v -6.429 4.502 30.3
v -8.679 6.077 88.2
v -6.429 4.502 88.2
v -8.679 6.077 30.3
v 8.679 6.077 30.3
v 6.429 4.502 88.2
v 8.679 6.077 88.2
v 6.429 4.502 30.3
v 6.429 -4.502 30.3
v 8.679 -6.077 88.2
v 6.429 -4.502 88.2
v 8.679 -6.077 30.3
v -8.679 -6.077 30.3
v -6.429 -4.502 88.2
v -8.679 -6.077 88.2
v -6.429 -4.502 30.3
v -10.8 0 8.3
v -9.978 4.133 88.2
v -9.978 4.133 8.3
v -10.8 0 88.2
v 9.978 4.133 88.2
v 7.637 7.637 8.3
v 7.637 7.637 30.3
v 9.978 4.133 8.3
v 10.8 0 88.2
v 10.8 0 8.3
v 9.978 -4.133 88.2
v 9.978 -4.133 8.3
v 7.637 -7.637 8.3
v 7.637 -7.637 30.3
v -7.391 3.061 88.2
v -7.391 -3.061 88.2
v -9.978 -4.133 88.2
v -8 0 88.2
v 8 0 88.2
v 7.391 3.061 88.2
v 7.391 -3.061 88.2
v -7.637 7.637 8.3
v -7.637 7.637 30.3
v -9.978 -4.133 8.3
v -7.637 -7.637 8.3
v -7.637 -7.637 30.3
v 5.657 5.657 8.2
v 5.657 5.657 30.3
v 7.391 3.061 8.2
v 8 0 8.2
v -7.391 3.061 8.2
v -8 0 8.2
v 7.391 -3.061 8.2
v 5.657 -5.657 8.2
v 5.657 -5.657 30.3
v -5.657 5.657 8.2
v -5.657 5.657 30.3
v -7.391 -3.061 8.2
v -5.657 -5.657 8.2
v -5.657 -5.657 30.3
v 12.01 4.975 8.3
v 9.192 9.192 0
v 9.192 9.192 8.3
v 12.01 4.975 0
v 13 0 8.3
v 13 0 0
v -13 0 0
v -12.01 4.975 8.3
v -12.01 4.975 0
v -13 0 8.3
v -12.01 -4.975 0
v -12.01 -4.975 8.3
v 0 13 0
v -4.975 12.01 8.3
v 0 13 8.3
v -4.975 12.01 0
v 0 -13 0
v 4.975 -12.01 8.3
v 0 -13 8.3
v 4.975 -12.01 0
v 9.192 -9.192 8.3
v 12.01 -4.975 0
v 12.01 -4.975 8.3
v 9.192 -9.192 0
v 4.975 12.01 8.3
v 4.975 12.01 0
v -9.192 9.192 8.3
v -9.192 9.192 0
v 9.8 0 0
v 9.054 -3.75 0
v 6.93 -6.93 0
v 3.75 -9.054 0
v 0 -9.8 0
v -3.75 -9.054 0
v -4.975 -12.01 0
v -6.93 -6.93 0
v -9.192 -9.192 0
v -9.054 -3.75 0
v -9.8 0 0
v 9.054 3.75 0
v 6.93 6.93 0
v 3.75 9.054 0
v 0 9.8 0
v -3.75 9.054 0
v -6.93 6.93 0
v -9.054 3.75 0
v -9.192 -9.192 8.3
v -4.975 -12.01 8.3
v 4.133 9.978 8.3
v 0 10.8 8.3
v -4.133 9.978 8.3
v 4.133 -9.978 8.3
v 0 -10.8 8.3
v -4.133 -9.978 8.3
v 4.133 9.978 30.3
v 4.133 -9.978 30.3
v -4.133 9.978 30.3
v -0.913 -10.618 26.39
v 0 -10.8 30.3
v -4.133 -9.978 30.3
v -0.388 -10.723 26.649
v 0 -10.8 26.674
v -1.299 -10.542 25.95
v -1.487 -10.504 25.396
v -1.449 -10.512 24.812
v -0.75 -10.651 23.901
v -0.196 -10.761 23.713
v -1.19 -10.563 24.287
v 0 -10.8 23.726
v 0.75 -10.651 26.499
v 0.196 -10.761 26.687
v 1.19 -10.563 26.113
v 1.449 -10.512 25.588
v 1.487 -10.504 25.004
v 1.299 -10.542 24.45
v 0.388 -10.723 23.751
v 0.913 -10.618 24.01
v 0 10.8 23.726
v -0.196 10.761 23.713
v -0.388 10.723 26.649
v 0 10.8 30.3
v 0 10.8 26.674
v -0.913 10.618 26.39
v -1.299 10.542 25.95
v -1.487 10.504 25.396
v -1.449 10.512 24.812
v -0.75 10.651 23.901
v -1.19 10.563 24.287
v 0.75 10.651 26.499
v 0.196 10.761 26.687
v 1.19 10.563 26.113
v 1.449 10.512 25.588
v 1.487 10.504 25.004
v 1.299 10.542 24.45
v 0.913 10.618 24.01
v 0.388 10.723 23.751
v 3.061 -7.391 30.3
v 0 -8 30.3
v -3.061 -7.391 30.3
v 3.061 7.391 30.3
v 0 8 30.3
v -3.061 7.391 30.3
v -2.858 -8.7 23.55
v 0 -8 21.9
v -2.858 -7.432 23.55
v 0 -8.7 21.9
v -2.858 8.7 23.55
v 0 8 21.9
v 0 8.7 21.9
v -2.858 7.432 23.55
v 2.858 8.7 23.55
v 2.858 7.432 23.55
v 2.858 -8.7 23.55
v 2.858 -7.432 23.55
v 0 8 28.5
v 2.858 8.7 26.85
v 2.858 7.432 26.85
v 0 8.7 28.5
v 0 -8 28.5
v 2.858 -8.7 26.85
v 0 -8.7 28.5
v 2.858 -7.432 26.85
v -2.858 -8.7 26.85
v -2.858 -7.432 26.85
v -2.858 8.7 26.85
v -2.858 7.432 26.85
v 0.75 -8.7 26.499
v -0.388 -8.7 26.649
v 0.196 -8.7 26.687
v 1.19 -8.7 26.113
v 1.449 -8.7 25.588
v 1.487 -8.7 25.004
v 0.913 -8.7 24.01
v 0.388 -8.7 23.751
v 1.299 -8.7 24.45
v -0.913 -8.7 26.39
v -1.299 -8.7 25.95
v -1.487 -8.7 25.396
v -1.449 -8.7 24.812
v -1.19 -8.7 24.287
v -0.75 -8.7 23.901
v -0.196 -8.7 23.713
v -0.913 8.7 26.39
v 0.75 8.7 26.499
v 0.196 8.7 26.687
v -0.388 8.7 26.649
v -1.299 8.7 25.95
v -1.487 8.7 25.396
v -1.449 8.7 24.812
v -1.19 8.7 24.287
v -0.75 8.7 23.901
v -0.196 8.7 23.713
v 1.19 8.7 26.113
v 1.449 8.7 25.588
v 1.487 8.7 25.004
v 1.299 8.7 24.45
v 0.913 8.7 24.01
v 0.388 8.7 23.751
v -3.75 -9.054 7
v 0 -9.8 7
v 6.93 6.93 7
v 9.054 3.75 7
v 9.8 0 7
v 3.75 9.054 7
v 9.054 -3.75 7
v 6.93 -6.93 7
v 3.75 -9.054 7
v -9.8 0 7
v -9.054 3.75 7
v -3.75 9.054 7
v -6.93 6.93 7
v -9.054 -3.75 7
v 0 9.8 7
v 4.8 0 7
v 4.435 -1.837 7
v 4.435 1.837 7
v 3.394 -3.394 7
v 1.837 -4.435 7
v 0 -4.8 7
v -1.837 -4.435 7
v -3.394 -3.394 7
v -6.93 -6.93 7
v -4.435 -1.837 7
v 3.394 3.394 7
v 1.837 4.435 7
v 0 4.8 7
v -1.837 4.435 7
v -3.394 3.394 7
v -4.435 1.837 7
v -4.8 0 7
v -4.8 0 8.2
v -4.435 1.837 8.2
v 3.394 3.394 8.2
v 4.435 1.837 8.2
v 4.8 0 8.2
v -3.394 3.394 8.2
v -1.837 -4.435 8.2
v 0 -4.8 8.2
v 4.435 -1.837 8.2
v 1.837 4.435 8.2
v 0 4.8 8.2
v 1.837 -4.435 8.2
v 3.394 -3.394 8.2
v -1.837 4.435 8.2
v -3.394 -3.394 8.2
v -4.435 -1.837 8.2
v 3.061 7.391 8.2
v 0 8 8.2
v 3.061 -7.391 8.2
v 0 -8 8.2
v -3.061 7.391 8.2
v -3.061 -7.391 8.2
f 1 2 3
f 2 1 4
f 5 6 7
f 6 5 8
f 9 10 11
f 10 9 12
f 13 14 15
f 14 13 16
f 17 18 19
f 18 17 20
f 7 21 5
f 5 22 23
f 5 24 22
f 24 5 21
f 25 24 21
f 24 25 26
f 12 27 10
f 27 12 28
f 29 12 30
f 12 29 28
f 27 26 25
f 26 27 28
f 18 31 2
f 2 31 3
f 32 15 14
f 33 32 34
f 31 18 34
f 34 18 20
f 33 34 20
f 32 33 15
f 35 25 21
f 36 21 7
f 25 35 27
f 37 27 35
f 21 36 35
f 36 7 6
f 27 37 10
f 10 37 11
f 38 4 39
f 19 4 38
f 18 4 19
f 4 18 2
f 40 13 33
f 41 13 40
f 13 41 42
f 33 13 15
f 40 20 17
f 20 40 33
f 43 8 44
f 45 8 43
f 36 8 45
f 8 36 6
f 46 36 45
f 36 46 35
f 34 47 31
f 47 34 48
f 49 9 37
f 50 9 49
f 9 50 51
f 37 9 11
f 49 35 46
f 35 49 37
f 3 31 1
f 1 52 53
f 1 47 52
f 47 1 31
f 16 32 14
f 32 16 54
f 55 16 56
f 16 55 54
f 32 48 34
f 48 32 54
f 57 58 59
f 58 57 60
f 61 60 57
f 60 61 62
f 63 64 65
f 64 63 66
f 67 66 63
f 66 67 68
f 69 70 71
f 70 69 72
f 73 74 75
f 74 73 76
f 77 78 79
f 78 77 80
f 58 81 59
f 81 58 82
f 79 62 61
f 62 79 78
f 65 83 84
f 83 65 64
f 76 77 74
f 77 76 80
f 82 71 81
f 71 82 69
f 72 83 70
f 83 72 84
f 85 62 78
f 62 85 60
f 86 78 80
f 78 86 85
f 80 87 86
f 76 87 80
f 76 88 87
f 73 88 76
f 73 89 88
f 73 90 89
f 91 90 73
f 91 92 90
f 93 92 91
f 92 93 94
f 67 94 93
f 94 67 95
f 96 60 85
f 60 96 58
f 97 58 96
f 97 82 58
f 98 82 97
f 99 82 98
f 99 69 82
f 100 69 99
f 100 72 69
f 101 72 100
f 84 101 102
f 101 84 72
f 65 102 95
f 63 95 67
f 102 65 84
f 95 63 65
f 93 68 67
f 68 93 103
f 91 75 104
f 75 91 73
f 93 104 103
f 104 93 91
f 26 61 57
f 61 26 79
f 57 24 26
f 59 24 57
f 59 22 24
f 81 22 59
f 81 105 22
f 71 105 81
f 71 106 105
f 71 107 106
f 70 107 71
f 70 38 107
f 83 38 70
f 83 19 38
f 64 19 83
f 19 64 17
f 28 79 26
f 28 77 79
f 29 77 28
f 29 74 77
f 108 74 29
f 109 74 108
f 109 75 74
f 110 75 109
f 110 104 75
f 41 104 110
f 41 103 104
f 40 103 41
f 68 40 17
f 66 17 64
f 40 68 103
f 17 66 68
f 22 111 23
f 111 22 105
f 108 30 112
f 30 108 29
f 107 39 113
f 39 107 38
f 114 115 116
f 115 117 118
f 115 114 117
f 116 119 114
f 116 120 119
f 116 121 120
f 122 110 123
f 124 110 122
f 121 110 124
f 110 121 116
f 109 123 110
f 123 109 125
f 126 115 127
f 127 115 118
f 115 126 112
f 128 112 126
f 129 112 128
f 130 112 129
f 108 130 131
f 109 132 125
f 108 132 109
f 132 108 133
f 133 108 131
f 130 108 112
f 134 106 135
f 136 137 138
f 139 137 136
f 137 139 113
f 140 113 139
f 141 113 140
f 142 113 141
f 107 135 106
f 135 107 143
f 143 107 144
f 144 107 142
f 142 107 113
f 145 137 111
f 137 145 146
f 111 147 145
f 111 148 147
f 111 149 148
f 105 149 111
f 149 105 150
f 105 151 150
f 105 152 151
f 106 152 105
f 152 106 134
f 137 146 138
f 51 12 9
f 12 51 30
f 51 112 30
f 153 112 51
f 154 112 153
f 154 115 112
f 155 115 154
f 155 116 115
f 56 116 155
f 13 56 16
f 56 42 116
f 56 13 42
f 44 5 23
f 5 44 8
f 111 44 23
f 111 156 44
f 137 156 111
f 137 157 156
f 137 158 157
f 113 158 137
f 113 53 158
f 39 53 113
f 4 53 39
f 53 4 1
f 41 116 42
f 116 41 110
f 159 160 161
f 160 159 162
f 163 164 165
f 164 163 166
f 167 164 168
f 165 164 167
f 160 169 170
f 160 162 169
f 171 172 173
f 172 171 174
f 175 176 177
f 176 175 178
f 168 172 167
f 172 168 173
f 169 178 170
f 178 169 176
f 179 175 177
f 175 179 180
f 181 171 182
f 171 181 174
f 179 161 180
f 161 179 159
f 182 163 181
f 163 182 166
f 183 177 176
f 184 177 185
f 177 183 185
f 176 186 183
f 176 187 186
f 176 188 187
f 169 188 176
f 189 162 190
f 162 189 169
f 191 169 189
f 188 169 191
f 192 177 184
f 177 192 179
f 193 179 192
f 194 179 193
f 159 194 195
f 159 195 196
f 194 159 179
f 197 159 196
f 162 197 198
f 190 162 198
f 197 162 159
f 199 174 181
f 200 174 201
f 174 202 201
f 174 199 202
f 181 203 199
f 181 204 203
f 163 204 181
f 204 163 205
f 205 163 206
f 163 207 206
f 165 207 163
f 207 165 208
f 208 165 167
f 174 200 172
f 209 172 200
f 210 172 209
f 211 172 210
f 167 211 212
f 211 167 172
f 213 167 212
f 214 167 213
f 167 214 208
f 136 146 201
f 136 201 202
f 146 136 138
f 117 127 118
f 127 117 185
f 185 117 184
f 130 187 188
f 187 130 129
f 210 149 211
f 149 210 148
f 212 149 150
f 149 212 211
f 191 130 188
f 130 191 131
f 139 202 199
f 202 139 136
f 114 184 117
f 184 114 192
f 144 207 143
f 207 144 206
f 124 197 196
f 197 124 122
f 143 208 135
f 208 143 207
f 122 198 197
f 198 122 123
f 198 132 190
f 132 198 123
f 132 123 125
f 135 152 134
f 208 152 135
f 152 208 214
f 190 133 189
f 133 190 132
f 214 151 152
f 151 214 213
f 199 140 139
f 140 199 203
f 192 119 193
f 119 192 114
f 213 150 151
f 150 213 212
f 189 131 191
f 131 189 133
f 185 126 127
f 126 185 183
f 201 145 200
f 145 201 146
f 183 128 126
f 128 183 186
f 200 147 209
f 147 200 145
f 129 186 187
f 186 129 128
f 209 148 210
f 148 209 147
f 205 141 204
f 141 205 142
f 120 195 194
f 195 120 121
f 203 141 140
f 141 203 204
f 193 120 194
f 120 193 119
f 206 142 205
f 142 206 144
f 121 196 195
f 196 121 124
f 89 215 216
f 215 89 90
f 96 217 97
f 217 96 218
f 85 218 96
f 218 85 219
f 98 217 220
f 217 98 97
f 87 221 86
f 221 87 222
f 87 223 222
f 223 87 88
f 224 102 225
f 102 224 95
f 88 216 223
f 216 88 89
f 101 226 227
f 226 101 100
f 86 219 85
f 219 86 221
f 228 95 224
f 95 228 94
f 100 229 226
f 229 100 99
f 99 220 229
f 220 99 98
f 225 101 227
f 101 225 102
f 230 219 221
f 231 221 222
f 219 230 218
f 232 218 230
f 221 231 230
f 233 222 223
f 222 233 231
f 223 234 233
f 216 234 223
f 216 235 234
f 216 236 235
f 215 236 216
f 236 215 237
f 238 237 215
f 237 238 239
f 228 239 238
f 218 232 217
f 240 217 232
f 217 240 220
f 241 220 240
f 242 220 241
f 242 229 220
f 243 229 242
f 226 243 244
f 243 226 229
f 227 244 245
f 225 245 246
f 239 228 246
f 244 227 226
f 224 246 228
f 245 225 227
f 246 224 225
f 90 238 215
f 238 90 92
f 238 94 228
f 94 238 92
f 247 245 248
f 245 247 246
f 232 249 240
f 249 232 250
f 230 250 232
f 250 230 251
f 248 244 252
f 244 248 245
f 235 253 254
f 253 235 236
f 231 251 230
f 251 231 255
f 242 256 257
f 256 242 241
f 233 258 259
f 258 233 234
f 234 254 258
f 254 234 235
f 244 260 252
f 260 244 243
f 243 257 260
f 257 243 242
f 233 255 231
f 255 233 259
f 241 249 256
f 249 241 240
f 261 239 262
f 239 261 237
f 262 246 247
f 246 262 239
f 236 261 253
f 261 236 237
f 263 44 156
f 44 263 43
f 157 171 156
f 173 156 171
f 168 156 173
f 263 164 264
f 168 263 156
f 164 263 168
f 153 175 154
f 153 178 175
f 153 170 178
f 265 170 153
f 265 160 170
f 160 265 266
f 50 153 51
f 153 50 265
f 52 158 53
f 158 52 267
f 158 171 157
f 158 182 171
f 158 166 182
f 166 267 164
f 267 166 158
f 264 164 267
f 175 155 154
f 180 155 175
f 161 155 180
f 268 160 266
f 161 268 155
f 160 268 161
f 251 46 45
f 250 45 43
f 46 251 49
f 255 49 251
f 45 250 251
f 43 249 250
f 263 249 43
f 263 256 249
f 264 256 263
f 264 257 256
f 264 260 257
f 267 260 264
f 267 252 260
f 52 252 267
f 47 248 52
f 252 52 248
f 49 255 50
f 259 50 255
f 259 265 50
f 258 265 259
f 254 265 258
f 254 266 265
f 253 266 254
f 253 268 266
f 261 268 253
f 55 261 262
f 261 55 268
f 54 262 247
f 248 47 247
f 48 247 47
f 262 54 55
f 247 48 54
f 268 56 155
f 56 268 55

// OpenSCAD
// file: electronic_parts.scad
module slide_switch() {
    l_handles = 19.7;
    e_handles = 0.4;
    e_total = 5.8;
    h_total = 7.6;
    l_block = 10.7;
    h_block = 5;
    l_button = 2.9;
    h_button = 5;
    e_button = 6;
    d_hole = 2.1;
    e_hole = 12.8; // ecart bord à bord, et pas centre à centre
    h_pin = h_total-h_block;
    l_pin = 1.5;
    e_pin = 0.4;
    l_3pins = 7.5;
    $fn = 10;
    module slide_switch_pin() {
        translate([0,e_pin/2,l_pin/2-h_pin])
        rotate([90,0,0]) {
            translate([l_pin/-2,0,0])
            cube([l_pin,h_pin-l_pin/2+0.1,e_pin]);
            cylinder(d=l_pin,h=e_pin);
        }
    }
    color("blue")
    difference() {
        union() {
            translate([l_handles/-2,e_total/-2,h_block-e_handles])
            cube([l_handles,e_total,e_handles]);
            translate([l_block/-2,e_total/-2,0])
            cube([l_block,e_total,h_block]);
            translate([e_button/2-l_button/2,0,0])
            translate([l_button/-2,l_button/-2,h_block-0.1])
            cube([l_button,l_button,h_button+0.1]);
            slide_switch_pin();
            translate([l_3pins/2-l_pin/2,0,0])
            slide_switch_pin();
            translate([l_pin/2-l_3pins/2,0,0])
            slide_switch_pin();
        }
        translate([e_hole/2+d_hole/2,0,h_block-e_handles-0.1])
        cylinder(d=d_hole,h=e_handles+0.2);
        translate([(e_hole/2+d_hole/2)*-1,0,h_block-e_handles-0.1])
        cylinder(d=d_hole,h=e_handles+0.2);
    }
}

module support_board() {
    h_total = 10.5;
    l_block = 10.7;
    h_block = 8.5;
    e_block = 5;
    l_pin = 0.6;
    e_pin = 0.3;
    h_pin = h_total-h_block;
    e_l_pins = 8.3;
    e_h_pins = 3;
    e_calc_l_pins = (e_l_pins-l_pin)/3;
    module support_board_pins() {
        translate([e_pin/-2,l_pin/-2,-h_pin])
        cube([e_pin,l_pin,h_pin+0.1]);
    }
    color("violet")
    union () {
        translate([e_block/-2,l_block/-2,0])
        cube([e_block,l_block,h_block]);
        translate([e_h_pins/-2+e_pin/2,0,0]) {
            translate([0,e_l_pins/-2+l_pin/2,0]) support_board_pins();
            translate([0,e_calc_l_pins/-2,0]) support_board_pins();
            translate([0,e_calc_l_pins/2,0]) support_board_pins();
            translate([0,e_l_pins/2-l_pin/2,0]) support_board_pins();
        }
        translate([e_h_pins/2-e_pin/2,0,0]) {
            translate([0,e_l_pins/-2+l_pin/2,0]) support_board_pins();
            translate([0,e_calc_l_pins/-2,0]) support_board_pins();
            translate([0,e_calc_l_pins/2,0]) support_board_pins();
            translate([0,e_l_pins/2-l_pin/2,0]) support_board_pins();
        }
    }
}

module esp8266_01() {
    l_board = 15;
    h_board = 25;
    e_board = 1.2;
    e_board_block = 0.5;
    h_block = 5;
    l_block = 9.8;
    e_block = 2.5;
    h_pin = 11.4;
    l_pin = 0.6;
    s_pin = 8.4;
    e_h_pins = 3.2;
    e_l_pins = 8.3;
    e_calc_l_pins = (e_l_pins-l_pin)/3;
    module board_pin() {
        translate([l_pin/-2,l_pin/-2,e_block-s_pin])
        cube([l_pin,l_pin,h_pin]);
    }
    color("green")
    union() {
        translate([h_block/-2-e_board_block,l_board/-2,e_block])
        cube([h_board,l_board,e_board]);
        translate([h_block/-2,l_block/-2,0])
        cube([h_block,l_block,e_block+0.1]);
        translate([e_h_pins/-2+l_pin/2,0,0]) {
            translate([0,e_l_pins/-2+l_pin/2,0]) board_pin();
            translate([0,e_calc_l_pins/-2,0]) board_pin();
            translate([0,e_calc_l_pins/2,0]) board_pin();
            translate([0,e_l_pins/2-l_pin/2,0]) board_pin();
        }
        translate([e_h_pins/2-l_pin/2,0,0]) {
            translate([0,e_l_pins/-2+l_pin/2,0]) board_pin();
            translate([0,e_calc_l_pins/-2,0]) board_pin();
            translate([0,e_calc_l_pins/2,0]) board_pin();
            translate([0,e_l_pins/2-l_pin/2,0]) board_pin();
        }
    }
}

module battery() {
    d_battery = 17;
    h_battery = 34;
    color("red")
    cylinder(d=d_battery,h=h_battery);
}

module shock_sensor() {
    d_sensor = 5;
    h_sensor = 11;
    l_pin = 0.6;
    h_pin = 2;
    color("orange")
    union() {
        cylinder(d=d_sensor,h=h_sensor);
        translate([l_pin/-2,l_pin/-2-1,-h_pin])
        cube([l_pin,l_pin,h_pin+0.1]);
        translate([l_pin/-2,l_pin/-2+1,-h_pin])
        cube([l_pin,l_pin,h_pin+0.1]);
    }
}
// main file
$fn = 16;
mode = "part"; // ["part", "compose"]
part = "magnet holder"; // ["magnet holder", "slice", "electric stage", "????", "cap"]
electric_stuff = false;

function FT_tube_DO() = 26;
function FT_tube_DI() = 21.6;
function FT_tube_T() = 1.6;
function FT_tube_secure_screw() = 22;
function FT_tube_screw_H() = 17;

function magnet_DO() = 19.6;
function magnet_H() = 7;
function magnet_storage_H() = 80;

function slice_thick() = 1.2;

function intern_D() = 16;
function rope_D() = 9.6;

function battery_D() = 18;
function battery_L() = 37;

include <electronic_parts.scad>

module holder2slice_block(block_height,inverted = false) {
    block_rot = 55+((inverted)? -2 : 0);
    block_span = FT_tube_DI()/2+0.2;
    difference() {
        cylinder(d=FT_tube_DI()+((inverted)? 0.1 : 0),h=block_height);
        translate([0,0,-0.1])
        cylinder(d=intern_D()-((inverted)? 0.1 : 0),h=block_height+0.2);
        translate([0,0,-0.1]) {
            rotate([0,0,block_rot])
            cube([block_span,block_span,block_height+0.2]);
            rotate([0,0,-block_rot])
            translate([-block_span,0,0])
            cube([block_span,block_span,block_height+0.2]);
            rotate([0,0,block_rot])
            translate([-block_span,-block_span,0])
            cube([block_span,block_span,block_height+0.2]);
            rotate([0,0,-block_rot])
            translate([0,-block_span,0])
            cube([block_span,block_span,block_height+0.2]);
        }
    }
}

module screws_and_bolts() {
    screw_D = 3;
    bolt_D = 6.6;
    bolt_deep = 1.4;
    rotate([90,30,0])
    union() {
        translate([0,0,(intern_D()+bolt_deep)/-2])
        cylinder(d=bolt_D,h=intern_D()+bolt_deep,$fn=6);
        translate([0,0,FT_tube_DI()/-2-0.1])
        cylinder(d=3,h=FT_tube_DI()+0.2);
    }
}

module magnet_holder() {
    out_part_H = magnet_H()+slice_thick();
    difference() {
        union() {
            cylinder(d=FT_tube_DO(),h=out_part_H+0.1);
            translate([0,0,out_part_H])
            cylinder(d=FT_tube_DI(),h=FT_tube_secure_screw()+0.1);
            translate([0,0,out_part_H+FT_tube_secure_screw()])
            holder2slice_block(magnet_storage_H()-FT_tube_secure_screw());
        }
        translate([0,0,-0.1])
        cylinder(d=magnet_DO(),h=magnet_H()+0.1); // magnet hole
        translate([0,0,magnet_H()-0.1])
        cylinder(d=rope_D(),h=slice_thick()+0.2); // rope eye
        translate([0,0,out_part_H])
        cylinder(d=intern_D(),h=magnet_storage_H()+0.1); // rope storage
        translate([0,0,out_part_H+FT_tube_screw_H()])
        screws_and_bolts();
        //
        //
        //translate([0,0,-0.1])
        //cube([FT_tube_DO(),FT_tube_DO(),FT_tube_DO()]);
        //
    }
}

module slice() {
    difference() {
        cylinder(d=FT_tube_DI(),h=slice_thick()*2);
        translate([0,0,slice_thick()]) {
            holder2slice_block(slice_thick()+0.1,true);
            cylinder(d=intern_D()-slice_thick()*2,h=slice_thick()+0.1);
        }
    }
}

module electric_stage() {
    back_cut_H = 4;
    back_cut_L = 12;
    battery_lvl = back_cut_H+slice_thick();
    battery_open_spanX = 2;
    battery_open_spanZ = 7;
    battery_open_H = battery_L()-battery_open_spanZ;
    total_cyl_length = back_cut_H+slice_thick()*2+battery_L();
    wire_D = 1.7;
    plate_hole_H = 1.5;
    plate_hole_L = 4;
    plate_hole_span = 7;
    support_L = 11.4;
    support_total_L = support_L+slice_thick()*2;
    support_T = 6;
    support_H = 5.8;
    support_span_board = 3.5;
    support_total_H = support_H+support_span_board+slice_thick();
    difference() {
        union() {
            cylinder(d=FT_tube_DI(),h=total_cyl_length);
            translate([slice_thick()-support_T,support_total_L/-2,total_cyl_length-0.1])
            cube([support_T,support_total_L,support_total_H+0.1]);
        }
        translate([FT_tube_DI()/-2-0.1,back_cut_L/-2,-0.1])
        cube([FT_tube_DI()+0.2,back_cut_L,back_cut_H+0.1]); // space for back led and wires
        translate([0,0,battery_lvl])
        cylinder(d=battery_D(),h=battery_L());
        translate([battery_open_spanX,FT_tube_DI()/-2-0.1,battery_lvl+battery_open_spanZ])
        cube([FT_tube_DI()/2+0.1,FT_tube_DI()+0.2,battery_open_H]);
        translate([FT_tube_DI()/-2-0.1,wire_D*-2,back_cut_H-0.1])
        cube([wire_D,wire_D*4,battery_L()+slice_thick()*2+0.2]); // wires tunnel
        translate([plate_hole_span,plate_hole_L/-2,back_cut_H-0.1])
        cube([plate_hole_H,plate_hole_L,battery_L()+slice_thick()*2+0.2]); // plate holes
        translate([slice_thick()-support_T-0.1,support_L/-2,total_cyl_length+support_span_board])
        cube([support_T+0.2,support_L,support_H]);
    }
}

module leds_support() {
    //
    //
}

module cap() {
    out_H = magnet_H()+slice_thick();
    in_ext_H = magnet_H()-slice_thick();
    cut_L = 12;
    cut_H = FT_tube_secure_screw()+slice_thick()*2;
    difference() {
        union() {
            cylinder(d=FT_tube_DO(),h=out_H);
            translate([0,0,out_H-0.1])
            cylinder(d=FT_tube_DI(),h=FT_tube_secure_screw()+0.1);
        }
        translate([0,0,-0.1])
        cylinder(d=intern_D(),h=in_ext_H+0.1);
        translate([0,0,in_ext_H-0.1])
        intersection() {
            cylinder(d=intern_D(),h=cut_H+0.2);
            translate([intern_D()/-2-0.1,cut_L/-2,-0.1])
            cube([intern_D()+0.2,cut_L,cut_H+0.4]);
        }
        translate([0,0,out_H+FT_tube_screw_H()])
        screws_and_bolts();
    }
}

if (mode == "part") {
    if (part == "magnet holder") { magnet_holder(); }
    else if (part == "slice") { slice(); }
    else if (part == "electric stage") {
        electric_stage();
        if (electric_stuff) {
            translate([0,0,6.7]) battery();
            translate([-7,0,49.8]) rotate([0,90,0]) support_board();
            translate([2,0,49.8]) rotate([180,-90,0]) esp8266_01();
            translate([-7,0,57]) shock_sensor();
        }
    }
    //
    //
    else if (part == "cap") { cap(); }
}
else if (mode == "compose") {
    tube_tr = magnet_H()+slice_thick()+0.2;
    color("purple")
    translate([0,0,tube_tr])
    difference() {
        cylinder(d=FT_tube_DO()-0.1,h=300);
        translate([0,0,-0.1])
        cylinder(d=FT_tube_DI()+0.1,h=300.2);
        translate([FT_tube_DO()/-2-0.1,0,-0.1])
        cube([FT_tube_DO()+0.2,FT_tube_DO()/2+0.1,300.2]);
    }
    magnet_holder();
    slice_H = magnet_H()+slice_thick()*2+magnet_storage_H()+0.1;
    translate([0,0,slice_H])
    rotate([180,0,0])
    slice();
    //
    //
    //
    translate([0,0,tube_tr+300+magnet_H()+slice_thick()+0.1])
    rotate([180,0,0])
    cap();
}
